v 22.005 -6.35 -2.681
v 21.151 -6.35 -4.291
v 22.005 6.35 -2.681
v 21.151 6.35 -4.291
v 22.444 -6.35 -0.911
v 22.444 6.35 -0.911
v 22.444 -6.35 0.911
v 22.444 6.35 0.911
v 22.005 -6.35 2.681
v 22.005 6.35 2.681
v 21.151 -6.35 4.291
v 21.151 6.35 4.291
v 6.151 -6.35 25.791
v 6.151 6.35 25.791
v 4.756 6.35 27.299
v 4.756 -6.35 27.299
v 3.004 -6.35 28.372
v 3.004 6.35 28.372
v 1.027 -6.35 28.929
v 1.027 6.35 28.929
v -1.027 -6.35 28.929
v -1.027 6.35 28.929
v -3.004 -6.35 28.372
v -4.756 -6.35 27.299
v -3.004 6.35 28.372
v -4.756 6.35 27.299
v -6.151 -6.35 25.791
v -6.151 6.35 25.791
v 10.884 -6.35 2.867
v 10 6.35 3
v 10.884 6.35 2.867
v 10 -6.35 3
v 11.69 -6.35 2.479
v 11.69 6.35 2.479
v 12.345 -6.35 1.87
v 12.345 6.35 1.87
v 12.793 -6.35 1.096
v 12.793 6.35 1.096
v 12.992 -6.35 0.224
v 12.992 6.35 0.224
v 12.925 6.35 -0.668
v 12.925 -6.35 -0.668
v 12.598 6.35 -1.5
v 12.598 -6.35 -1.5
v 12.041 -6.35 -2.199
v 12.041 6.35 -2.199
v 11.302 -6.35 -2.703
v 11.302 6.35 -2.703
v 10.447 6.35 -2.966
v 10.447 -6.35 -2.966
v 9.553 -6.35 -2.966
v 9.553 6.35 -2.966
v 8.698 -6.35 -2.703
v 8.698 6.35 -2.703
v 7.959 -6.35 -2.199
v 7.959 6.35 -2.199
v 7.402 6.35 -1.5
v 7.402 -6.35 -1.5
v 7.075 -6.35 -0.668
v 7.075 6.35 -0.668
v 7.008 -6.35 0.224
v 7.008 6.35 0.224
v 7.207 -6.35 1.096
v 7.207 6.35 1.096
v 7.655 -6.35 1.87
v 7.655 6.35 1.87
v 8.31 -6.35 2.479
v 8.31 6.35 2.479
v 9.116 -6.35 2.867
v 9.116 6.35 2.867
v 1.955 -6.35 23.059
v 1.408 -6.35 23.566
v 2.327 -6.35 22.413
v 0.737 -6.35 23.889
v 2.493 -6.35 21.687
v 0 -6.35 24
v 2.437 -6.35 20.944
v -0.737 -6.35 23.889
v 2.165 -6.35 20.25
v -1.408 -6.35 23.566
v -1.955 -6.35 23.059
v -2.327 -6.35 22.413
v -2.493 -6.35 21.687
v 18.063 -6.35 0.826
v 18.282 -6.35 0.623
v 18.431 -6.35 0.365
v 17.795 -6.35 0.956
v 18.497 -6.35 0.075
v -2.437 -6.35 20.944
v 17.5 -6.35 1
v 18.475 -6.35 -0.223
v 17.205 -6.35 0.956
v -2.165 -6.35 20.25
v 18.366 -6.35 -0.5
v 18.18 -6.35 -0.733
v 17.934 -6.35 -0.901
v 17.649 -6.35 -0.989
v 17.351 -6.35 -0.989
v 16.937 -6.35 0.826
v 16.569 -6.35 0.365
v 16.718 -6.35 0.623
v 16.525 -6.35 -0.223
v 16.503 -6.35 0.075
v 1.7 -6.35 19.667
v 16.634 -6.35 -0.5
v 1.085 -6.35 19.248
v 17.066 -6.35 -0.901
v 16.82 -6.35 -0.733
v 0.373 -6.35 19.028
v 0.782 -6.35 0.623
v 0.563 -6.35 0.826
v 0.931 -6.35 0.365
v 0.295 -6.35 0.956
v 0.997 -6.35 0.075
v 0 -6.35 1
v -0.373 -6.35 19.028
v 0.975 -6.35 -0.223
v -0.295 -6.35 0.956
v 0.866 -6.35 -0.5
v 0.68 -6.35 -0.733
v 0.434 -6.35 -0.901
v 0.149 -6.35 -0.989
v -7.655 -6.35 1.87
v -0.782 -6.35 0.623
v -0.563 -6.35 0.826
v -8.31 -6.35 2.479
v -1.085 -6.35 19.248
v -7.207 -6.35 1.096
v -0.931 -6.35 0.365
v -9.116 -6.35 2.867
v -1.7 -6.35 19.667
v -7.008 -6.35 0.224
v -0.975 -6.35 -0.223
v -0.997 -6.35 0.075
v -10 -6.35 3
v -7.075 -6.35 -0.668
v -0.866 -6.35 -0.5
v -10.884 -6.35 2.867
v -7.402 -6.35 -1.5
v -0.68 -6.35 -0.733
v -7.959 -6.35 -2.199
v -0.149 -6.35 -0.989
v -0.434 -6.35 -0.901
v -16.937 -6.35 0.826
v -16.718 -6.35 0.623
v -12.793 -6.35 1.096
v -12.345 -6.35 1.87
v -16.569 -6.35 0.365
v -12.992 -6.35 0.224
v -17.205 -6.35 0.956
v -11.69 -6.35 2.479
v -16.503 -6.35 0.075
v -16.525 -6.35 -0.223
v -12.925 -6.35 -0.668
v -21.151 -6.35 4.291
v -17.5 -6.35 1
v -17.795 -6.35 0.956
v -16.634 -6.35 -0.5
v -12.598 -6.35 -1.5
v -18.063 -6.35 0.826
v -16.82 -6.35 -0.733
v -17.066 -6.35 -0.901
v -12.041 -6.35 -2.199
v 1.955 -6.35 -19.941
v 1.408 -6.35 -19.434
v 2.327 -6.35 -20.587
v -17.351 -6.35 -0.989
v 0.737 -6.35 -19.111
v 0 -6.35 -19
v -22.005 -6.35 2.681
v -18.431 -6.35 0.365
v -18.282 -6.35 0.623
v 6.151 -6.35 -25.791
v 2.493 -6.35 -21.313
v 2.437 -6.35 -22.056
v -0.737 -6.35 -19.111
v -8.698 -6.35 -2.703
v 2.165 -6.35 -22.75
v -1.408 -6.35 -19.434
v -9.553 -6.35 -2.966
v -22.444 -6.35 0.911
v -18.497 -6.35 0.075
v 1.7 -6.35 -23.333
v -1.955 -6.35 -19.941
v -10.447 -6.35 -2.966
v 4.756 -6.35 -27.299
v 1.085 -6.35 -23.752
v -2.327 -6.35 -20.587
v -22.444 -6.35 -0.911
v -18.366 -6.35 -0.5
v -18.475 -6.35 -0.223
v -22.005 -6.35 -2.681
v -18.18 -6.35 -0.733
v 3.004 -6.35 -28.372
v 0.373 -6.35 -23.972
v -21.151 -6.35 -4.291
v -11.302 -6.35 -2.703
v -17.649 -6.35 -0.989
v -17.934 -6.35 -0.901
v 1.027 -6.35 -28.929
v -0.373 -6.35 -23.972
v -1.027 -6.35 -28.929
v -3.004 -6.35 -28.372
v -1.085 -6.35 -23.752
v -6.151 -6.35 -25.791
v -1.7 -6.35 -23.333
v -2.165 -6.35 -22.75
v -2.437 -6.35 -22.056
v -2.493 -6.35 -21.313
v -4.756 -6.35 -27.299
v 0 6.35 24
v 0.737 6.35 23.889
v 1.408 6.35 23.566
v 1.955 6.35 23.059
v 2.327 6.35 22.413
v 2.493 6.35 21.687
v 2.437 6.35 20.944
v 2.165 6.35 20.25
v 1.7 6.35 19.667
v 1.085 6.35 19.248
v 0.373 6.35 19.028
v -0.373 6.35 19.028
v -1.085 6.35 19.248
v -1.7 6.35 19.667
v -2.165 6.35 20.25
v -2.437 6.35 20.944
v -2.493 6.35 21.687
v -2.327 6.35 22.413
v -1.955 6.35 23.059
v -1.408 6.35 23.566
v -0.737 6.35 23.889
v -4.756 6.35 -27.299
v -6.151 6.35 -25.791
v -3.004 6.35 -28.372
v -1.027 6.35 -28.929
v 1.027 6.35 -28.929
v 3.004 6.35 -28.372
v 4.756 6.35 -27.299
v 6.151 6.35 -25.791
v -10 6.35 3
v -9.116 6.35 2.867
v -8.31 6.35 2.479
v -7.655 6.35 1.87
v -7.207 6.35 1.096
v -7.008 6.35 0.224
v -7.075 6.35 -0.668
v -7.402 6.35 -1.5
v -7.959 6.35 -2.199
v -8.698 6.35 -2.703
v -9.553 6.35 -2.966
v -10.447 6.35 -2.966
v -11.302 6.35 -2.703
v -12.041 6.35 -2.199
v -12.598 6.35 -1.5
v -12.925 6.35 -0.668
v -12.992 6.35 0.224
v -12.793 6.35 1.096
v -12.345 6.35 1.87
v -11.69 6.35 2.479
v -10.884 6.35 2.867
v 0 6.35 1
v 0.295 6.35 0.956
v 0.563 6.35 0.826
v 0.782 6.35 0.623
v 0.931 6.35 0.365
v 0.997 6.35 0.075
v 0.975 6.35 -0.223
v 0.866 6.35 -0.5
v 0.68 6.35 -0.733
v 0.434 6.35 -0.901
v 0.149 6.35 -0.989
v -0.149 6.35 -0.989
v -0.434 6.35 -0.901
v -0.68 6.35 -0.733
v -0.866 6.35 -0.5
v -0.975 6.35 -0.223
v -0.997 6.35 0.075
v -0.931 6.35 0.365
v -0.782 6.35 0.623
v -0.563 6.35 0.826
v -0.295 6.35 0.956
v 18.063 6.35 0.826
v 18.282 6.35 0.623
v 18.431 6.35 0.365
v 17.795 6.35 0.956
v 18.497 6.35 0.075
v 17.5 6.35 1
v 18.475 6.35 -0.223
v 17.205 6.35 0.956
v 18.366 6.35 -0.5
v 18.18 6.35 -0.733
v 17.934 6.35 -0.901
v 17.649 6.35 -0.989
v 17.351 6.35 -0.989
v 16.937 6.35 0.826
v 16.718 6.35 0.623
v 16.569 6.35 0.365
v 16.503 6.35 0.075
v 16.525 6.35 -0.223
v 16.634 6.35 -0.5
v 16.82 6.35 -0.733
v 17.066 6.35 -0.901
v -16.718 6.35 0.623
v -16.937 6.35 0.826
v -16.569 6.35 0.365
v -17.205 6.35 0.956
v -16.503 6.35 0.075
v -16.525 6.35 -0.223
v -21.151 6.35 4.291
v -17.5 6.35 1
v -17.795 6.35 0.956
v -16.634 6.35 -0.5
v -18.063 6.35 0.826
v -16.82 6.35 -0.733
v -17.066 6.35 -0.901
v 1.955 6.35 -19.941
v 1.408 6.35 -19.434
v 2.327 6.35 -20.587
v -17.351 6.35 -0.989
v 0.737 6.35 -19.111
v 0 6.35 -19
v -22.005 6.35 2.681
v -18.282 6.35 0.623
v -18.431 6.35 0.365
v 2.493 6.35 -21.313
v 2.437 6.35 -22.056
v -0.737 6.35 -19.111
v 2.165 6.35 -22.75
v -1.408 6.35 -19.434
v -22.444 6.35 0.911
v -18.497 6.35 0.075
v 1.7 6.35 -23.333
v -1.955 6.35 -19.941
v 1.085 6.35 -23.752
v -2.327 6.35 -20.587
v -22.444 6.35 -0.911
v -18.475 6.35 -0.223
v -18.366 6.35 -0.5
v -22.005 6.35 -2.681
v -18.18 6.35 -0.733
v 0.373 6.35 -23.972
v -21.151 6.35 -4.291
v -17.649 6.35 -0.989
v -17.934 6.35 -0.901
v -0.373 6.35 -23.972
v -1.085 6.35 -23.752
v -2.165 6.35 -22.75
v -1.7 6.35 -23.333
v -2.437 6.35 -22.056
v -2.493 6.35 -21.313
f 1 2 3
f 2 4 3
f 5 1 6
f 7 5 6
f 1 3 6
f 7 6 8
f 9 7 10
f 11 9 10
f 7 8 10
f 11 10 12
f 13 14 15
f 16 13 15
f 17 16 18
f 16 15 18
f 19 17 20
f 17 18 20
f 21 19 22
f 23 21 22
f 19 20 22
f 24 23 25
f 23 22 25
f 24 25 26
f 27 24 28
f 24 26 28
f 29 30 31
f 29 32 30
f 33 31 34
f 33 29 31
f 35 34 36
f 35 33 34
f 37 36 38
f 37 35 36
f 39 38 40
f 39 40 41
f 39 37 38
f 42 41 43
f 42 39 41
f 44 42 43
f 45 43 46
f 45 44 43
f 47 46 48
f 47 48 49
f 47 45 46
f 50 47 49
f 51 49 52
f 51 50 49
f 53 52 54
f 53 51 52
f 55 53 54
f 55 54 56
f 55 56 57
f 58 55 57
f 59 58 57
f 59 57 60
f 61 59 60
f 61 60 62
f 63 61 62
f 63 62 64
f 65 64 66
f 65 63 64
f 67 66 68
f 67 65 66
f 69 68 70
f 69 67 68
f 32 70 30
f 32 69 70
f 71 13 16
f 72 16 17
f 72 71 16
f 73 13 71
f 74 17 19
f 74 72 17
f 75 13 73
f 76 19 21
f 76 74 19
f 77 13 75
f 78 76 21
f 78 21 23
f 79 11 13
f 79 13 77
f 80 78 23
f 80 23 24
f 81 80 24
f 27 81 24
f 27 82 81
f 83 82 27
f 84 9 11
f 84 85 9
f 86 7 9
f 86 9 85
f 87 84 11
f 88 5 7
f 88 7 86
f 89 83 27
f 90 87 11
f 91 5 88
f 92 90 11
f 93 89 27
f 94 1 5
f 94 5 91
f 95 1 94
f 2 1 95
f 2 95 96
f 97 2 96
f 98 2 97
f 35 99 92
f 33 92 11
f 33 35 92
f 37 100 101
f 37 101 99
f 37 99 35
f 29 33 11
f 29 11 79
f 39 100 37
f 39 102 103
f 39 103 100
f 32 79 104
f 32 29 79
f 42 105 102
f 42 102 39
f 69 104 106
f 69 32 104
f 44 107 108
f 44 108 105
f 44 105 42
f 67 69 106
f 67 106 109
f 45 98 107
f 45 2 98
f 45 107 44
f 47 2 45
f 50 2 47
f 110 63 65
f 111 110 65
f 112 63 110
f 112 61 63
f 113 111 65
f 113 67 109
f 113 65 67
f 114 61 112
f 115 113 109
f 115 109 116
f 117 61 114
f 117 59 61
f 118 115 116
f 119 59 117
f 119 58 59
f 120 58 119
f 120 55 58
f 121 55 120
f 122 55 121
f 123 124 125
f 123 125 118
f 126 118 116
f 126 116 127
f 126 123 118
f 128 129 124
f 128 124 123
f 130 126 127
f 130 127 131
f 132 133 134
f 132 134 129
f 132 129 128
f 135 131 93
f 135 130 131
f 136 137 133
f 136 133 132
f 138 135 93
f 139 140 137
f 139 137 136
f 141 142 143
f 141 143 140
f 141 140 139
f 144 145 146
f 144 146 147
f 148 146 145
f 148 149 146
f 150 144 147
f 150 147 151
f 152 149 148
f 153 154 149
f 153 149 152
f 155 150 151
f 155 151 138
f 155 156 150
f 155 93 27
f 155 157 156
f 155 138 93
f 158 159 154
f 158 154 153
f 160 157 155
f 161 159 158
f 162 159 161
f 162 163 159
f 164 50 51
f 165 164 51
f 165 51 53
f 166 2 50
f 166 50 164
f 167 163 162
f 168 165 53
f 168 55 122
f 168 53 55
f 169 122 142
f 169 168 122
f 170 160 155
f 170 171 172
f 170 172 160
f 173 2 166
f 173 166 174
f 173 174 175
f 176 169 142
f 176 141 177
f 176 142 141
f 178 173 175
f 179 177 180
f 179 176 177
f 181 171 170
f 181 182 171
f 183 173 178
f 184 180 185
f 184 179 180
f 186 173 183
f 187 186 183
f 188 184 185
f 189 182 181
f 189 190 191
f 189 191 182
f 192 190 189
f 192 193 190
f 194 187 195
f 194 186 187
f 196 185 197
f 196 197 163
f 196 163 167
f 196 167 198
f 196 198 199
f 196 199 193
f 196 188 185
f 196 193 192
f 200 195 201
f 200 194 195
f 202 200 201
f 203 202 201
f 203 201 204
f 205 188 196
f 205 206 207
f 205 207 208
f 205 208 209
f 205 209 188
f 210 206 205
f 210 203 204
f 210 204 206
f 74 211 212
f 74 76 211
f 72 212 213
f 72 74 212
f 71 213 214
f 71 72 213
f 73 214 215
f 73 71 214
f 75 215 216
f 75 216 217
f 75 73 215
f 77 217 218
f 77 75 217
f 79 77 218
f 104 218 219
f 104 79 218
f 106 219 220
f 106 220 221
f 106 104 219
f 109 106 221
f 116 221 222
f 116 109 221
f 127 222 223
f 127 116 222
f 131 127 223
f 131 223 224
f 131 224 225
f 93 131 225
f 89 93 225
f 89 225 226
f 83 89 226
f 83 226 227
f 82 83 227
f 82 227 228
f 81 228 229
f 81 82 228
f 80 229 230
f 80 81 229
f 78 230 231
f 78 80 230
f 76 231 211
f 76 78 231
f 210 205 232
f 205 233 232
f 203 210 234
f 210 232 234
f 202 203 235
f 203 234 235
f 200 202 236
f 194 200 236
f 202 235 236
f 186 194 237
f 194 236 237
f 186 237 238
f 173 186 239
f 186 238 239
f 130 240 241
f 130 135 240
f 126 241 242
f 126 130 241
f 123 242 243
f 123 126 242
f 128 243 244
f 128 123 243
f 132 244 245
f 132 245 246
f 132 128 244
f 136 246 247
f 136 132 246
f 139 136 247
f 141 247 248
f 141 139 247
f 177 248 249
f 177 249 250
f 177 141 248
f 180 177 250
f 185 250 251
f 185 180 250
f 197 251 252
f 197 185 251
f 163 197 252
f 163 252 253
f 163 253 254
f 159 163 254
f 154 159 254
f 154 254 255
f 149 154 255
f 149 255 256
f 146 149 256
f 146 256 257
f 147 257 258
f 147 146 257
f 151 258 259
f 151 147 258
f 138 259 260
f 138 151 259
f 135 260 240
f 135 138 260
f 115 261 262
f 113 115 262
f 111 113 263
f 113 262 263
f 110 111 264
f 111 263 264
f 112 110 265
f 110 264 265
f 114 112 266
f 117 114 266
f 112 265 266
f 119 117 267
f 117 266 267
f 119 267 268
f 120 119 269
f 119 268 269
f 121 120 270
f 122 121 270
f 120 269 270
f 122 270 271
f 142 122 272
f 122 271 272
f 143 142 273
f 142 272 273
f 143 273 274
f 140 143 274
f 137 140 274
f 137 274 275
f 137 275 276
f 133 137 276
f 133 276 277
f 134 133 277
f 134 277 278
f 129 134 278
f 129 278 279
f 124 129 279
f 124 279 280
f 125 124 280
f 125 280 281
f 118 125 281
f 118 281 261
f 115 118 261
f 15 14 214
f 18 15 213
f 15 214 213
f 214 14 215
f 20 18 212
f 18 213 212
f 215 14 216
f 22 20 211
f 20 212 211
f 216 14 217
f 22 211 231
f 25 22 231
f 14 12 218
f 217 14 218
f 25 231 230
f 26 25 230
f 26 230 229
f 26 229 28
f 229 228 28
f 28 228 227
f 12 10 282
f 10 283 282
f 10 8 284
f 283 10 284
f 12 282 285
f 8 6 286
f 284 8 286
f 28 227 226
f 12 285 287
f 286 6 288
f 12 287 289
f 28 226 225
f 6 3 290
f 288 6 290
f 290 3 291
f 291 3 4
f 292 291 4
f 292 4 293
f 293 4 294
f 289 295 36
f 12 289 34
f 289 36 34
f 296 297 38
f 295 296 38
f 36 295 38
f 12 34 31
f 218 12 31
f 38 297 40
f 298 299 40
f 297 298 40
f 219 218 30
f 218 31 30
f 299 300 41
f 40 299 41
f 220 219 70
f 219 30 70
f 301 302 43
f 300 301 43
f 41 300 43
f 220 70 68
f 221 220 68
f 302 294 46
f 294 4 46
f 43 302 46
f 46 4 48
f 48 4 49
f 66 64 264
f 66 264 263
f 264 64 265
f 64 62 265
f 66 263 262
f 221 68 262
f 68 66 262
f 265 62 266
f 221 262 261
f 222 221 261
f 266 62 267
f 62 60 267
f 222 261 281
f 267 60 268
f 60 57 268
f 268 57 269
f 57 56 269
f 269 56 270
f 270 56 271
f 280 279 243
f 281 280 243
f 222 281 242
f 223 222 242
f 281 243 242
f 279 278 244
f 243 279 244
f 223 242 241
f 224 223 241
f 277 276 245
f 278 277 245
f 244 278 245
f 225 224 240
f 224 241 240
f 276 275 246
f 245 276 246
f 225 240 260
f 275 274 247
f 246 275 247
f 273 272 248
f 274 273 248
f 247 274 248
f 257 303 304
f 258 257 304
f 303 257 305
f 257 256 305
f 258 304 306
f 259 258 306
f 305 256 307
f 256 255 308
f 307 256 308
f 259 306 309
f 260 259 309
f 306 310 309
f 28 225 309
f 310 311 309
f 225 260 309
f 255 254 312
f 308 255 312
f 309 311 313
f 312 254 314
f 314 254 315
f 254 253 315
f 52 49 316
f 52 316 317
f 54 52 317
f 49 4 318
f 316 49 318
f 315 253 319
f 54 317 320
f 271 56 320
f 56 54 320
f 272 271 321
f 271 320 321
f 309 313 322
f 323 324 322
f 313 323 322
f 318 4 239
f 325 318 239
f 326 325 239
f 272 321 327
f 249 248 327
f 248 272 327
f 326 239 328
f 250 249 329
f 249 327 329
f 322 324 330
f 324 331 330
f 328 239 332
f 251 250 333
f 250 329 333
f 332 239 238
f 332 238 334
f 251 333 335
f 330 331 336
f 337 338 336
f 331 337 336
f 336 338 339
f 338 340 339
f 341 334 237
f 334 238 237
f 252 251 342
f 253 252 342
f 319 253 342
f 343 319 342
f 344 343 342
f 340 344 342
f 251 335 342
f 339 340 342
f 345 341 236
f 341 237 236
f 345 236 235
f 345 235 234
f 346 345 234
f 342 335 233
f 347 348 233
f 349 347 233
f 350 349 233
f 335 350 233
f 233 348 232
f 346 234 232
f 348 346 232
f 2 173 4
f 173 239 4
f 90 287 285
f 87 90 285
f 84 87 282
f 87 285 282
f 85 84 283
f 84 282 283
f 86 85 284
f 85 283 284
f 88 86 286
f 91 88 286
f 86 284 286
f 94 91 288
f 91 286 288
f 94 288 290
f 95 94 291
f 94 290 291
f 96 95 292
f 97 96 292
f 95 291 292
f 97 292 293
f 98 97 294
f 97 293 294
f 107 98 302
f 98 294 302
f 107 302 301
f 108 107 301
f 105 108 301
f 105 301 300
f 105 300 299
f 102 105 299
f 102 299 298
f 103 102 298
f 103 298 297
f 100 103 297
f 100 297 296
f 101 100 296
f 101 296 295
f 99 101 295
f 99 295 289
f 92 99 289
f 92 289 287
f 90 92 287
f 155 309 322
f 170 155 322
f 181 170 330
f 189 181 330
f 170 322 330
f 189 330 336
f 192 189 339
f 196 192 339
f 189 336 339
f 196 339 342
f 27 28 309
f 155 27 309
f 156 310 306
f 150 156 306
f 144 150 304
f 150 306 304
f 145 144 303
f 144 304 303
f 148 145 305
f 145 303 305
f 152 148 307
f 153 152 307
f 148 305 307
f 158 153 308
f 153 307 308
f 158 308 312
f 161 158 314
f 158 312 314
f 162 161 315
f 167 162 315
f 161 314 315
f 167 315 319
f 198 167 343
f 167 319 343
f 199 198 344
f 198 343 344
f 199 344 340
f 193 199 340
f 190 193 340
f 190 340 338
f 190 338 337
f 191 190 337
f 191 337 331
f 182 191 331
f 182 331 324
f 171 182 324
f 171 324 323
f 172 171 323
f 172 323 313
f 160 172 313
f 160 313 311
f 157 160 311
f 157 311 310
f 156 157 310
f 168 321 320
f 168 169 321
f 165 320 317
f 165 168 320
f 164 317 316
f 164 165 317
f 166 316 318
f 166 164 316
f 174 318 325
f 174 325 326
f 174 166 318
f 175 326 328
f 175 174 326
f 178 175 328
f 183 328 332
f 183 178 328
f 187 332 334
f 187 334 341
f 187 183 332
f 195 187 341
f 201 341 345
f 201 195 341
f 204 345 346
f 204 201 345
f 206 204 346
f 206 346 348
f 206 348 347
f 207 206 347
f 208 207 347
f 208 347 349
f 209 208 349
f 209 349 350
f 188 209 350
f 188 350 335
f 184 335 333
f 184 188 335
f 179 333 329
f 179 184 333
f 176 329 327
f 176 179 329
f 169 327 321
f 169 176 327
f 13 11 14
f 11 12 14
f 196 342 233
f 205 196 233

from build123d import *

# Parameters (mm, degrees)
SKETCH1_R                 = 2.5
SKETCH1_R_2               = 3
BOSS_EXTRUDE1_DEPTH       = 6.35
SKETCH2_R                 = 1
POTENTIOMETER_HOLES_DEPTH = 39.839927909


with BuildPart() as part:
    # Sketch1 → Boss-Extrude1 (new, symmetric)
    with BuildSketch(Plane(origin=(0, 0, 0), x_dir=(1, 0, 0), z_dir=(0, 1, 0))):
        with BuildLine():
            Line((-21.150952157, 4.29136197), (-6.150952157, 25.79136197))
            ThreePointArc((-6.150952157, 25.79136197), (0, 29), (6.150952157, 25.79136197))
            Line((6.150952157, 25.79136197), (21.150952157, 4.29136197))
            ThreePointArc((21.150952157, 4.29136197), (22.5, 0), (21.150952157, -4.29136197))
            Line((21.150952157, -4.29136197), (6.150952157, -25.79136197))
            ThreePointArc((6.150952157, -25.79136197), (0, -29), (-6.150952157, -25.79136197))
            Line((-6.150952157, -25.79136197), (-21.150952157, -4.29136197))
            ThreePointArc((-21.150952157, -4.29136197), (-22.5, 0), (-21.150952157, 4.29136197))
        make_face()
        with Locations(Location((0, 21.5, 0), (0, 0, 270))):
            Circle(SKETCH1_R, mode=Mode.SUBTRACT)
        with Locations(Location((0, -21.5, 0), (0, 0, 270))):
            Circle(SKETCH1_R, mode=Mode.SUBTRACT)
        with Locations(Location((-10, 0, 0), (0, 0, 270))):
            Circle(SKETCH1_R_2, mode=Mode.SUBTRACT)
        with Locations(Location((10, 0, 0), (0, 0, 270))):
            Circle(SKETCH1_R_2, mode=Mode.SUBTRACT)
    extrude(amount=BOSS_EXTRUDE1_DEPTH, both=True)

    # Sketch2 → Potentiometer Holes (cut, through all)
    with BuildSketch(Plane(origin=(0, 6.35, 0), x_dir=(1, 0, 0), z_dir=(0, 1, 0))):
        with Locations(Location((-17.5, 0, 0), (0, 0, 270))):
            Circle(SKETCH2_R)
        with Locations(Location((17.5, 0, 0), (0, 0, 270))):
            Circle(SKETCH2_R)
        with Locations(Location((0, 0, 0), (0, 0, 270))):
            Circle(SKETCH2_R)
    extrude(amount=-POTENTIOMETER_HOLES_DEPTH, mode=Mode.SUBTRACT)


solid = part.part
